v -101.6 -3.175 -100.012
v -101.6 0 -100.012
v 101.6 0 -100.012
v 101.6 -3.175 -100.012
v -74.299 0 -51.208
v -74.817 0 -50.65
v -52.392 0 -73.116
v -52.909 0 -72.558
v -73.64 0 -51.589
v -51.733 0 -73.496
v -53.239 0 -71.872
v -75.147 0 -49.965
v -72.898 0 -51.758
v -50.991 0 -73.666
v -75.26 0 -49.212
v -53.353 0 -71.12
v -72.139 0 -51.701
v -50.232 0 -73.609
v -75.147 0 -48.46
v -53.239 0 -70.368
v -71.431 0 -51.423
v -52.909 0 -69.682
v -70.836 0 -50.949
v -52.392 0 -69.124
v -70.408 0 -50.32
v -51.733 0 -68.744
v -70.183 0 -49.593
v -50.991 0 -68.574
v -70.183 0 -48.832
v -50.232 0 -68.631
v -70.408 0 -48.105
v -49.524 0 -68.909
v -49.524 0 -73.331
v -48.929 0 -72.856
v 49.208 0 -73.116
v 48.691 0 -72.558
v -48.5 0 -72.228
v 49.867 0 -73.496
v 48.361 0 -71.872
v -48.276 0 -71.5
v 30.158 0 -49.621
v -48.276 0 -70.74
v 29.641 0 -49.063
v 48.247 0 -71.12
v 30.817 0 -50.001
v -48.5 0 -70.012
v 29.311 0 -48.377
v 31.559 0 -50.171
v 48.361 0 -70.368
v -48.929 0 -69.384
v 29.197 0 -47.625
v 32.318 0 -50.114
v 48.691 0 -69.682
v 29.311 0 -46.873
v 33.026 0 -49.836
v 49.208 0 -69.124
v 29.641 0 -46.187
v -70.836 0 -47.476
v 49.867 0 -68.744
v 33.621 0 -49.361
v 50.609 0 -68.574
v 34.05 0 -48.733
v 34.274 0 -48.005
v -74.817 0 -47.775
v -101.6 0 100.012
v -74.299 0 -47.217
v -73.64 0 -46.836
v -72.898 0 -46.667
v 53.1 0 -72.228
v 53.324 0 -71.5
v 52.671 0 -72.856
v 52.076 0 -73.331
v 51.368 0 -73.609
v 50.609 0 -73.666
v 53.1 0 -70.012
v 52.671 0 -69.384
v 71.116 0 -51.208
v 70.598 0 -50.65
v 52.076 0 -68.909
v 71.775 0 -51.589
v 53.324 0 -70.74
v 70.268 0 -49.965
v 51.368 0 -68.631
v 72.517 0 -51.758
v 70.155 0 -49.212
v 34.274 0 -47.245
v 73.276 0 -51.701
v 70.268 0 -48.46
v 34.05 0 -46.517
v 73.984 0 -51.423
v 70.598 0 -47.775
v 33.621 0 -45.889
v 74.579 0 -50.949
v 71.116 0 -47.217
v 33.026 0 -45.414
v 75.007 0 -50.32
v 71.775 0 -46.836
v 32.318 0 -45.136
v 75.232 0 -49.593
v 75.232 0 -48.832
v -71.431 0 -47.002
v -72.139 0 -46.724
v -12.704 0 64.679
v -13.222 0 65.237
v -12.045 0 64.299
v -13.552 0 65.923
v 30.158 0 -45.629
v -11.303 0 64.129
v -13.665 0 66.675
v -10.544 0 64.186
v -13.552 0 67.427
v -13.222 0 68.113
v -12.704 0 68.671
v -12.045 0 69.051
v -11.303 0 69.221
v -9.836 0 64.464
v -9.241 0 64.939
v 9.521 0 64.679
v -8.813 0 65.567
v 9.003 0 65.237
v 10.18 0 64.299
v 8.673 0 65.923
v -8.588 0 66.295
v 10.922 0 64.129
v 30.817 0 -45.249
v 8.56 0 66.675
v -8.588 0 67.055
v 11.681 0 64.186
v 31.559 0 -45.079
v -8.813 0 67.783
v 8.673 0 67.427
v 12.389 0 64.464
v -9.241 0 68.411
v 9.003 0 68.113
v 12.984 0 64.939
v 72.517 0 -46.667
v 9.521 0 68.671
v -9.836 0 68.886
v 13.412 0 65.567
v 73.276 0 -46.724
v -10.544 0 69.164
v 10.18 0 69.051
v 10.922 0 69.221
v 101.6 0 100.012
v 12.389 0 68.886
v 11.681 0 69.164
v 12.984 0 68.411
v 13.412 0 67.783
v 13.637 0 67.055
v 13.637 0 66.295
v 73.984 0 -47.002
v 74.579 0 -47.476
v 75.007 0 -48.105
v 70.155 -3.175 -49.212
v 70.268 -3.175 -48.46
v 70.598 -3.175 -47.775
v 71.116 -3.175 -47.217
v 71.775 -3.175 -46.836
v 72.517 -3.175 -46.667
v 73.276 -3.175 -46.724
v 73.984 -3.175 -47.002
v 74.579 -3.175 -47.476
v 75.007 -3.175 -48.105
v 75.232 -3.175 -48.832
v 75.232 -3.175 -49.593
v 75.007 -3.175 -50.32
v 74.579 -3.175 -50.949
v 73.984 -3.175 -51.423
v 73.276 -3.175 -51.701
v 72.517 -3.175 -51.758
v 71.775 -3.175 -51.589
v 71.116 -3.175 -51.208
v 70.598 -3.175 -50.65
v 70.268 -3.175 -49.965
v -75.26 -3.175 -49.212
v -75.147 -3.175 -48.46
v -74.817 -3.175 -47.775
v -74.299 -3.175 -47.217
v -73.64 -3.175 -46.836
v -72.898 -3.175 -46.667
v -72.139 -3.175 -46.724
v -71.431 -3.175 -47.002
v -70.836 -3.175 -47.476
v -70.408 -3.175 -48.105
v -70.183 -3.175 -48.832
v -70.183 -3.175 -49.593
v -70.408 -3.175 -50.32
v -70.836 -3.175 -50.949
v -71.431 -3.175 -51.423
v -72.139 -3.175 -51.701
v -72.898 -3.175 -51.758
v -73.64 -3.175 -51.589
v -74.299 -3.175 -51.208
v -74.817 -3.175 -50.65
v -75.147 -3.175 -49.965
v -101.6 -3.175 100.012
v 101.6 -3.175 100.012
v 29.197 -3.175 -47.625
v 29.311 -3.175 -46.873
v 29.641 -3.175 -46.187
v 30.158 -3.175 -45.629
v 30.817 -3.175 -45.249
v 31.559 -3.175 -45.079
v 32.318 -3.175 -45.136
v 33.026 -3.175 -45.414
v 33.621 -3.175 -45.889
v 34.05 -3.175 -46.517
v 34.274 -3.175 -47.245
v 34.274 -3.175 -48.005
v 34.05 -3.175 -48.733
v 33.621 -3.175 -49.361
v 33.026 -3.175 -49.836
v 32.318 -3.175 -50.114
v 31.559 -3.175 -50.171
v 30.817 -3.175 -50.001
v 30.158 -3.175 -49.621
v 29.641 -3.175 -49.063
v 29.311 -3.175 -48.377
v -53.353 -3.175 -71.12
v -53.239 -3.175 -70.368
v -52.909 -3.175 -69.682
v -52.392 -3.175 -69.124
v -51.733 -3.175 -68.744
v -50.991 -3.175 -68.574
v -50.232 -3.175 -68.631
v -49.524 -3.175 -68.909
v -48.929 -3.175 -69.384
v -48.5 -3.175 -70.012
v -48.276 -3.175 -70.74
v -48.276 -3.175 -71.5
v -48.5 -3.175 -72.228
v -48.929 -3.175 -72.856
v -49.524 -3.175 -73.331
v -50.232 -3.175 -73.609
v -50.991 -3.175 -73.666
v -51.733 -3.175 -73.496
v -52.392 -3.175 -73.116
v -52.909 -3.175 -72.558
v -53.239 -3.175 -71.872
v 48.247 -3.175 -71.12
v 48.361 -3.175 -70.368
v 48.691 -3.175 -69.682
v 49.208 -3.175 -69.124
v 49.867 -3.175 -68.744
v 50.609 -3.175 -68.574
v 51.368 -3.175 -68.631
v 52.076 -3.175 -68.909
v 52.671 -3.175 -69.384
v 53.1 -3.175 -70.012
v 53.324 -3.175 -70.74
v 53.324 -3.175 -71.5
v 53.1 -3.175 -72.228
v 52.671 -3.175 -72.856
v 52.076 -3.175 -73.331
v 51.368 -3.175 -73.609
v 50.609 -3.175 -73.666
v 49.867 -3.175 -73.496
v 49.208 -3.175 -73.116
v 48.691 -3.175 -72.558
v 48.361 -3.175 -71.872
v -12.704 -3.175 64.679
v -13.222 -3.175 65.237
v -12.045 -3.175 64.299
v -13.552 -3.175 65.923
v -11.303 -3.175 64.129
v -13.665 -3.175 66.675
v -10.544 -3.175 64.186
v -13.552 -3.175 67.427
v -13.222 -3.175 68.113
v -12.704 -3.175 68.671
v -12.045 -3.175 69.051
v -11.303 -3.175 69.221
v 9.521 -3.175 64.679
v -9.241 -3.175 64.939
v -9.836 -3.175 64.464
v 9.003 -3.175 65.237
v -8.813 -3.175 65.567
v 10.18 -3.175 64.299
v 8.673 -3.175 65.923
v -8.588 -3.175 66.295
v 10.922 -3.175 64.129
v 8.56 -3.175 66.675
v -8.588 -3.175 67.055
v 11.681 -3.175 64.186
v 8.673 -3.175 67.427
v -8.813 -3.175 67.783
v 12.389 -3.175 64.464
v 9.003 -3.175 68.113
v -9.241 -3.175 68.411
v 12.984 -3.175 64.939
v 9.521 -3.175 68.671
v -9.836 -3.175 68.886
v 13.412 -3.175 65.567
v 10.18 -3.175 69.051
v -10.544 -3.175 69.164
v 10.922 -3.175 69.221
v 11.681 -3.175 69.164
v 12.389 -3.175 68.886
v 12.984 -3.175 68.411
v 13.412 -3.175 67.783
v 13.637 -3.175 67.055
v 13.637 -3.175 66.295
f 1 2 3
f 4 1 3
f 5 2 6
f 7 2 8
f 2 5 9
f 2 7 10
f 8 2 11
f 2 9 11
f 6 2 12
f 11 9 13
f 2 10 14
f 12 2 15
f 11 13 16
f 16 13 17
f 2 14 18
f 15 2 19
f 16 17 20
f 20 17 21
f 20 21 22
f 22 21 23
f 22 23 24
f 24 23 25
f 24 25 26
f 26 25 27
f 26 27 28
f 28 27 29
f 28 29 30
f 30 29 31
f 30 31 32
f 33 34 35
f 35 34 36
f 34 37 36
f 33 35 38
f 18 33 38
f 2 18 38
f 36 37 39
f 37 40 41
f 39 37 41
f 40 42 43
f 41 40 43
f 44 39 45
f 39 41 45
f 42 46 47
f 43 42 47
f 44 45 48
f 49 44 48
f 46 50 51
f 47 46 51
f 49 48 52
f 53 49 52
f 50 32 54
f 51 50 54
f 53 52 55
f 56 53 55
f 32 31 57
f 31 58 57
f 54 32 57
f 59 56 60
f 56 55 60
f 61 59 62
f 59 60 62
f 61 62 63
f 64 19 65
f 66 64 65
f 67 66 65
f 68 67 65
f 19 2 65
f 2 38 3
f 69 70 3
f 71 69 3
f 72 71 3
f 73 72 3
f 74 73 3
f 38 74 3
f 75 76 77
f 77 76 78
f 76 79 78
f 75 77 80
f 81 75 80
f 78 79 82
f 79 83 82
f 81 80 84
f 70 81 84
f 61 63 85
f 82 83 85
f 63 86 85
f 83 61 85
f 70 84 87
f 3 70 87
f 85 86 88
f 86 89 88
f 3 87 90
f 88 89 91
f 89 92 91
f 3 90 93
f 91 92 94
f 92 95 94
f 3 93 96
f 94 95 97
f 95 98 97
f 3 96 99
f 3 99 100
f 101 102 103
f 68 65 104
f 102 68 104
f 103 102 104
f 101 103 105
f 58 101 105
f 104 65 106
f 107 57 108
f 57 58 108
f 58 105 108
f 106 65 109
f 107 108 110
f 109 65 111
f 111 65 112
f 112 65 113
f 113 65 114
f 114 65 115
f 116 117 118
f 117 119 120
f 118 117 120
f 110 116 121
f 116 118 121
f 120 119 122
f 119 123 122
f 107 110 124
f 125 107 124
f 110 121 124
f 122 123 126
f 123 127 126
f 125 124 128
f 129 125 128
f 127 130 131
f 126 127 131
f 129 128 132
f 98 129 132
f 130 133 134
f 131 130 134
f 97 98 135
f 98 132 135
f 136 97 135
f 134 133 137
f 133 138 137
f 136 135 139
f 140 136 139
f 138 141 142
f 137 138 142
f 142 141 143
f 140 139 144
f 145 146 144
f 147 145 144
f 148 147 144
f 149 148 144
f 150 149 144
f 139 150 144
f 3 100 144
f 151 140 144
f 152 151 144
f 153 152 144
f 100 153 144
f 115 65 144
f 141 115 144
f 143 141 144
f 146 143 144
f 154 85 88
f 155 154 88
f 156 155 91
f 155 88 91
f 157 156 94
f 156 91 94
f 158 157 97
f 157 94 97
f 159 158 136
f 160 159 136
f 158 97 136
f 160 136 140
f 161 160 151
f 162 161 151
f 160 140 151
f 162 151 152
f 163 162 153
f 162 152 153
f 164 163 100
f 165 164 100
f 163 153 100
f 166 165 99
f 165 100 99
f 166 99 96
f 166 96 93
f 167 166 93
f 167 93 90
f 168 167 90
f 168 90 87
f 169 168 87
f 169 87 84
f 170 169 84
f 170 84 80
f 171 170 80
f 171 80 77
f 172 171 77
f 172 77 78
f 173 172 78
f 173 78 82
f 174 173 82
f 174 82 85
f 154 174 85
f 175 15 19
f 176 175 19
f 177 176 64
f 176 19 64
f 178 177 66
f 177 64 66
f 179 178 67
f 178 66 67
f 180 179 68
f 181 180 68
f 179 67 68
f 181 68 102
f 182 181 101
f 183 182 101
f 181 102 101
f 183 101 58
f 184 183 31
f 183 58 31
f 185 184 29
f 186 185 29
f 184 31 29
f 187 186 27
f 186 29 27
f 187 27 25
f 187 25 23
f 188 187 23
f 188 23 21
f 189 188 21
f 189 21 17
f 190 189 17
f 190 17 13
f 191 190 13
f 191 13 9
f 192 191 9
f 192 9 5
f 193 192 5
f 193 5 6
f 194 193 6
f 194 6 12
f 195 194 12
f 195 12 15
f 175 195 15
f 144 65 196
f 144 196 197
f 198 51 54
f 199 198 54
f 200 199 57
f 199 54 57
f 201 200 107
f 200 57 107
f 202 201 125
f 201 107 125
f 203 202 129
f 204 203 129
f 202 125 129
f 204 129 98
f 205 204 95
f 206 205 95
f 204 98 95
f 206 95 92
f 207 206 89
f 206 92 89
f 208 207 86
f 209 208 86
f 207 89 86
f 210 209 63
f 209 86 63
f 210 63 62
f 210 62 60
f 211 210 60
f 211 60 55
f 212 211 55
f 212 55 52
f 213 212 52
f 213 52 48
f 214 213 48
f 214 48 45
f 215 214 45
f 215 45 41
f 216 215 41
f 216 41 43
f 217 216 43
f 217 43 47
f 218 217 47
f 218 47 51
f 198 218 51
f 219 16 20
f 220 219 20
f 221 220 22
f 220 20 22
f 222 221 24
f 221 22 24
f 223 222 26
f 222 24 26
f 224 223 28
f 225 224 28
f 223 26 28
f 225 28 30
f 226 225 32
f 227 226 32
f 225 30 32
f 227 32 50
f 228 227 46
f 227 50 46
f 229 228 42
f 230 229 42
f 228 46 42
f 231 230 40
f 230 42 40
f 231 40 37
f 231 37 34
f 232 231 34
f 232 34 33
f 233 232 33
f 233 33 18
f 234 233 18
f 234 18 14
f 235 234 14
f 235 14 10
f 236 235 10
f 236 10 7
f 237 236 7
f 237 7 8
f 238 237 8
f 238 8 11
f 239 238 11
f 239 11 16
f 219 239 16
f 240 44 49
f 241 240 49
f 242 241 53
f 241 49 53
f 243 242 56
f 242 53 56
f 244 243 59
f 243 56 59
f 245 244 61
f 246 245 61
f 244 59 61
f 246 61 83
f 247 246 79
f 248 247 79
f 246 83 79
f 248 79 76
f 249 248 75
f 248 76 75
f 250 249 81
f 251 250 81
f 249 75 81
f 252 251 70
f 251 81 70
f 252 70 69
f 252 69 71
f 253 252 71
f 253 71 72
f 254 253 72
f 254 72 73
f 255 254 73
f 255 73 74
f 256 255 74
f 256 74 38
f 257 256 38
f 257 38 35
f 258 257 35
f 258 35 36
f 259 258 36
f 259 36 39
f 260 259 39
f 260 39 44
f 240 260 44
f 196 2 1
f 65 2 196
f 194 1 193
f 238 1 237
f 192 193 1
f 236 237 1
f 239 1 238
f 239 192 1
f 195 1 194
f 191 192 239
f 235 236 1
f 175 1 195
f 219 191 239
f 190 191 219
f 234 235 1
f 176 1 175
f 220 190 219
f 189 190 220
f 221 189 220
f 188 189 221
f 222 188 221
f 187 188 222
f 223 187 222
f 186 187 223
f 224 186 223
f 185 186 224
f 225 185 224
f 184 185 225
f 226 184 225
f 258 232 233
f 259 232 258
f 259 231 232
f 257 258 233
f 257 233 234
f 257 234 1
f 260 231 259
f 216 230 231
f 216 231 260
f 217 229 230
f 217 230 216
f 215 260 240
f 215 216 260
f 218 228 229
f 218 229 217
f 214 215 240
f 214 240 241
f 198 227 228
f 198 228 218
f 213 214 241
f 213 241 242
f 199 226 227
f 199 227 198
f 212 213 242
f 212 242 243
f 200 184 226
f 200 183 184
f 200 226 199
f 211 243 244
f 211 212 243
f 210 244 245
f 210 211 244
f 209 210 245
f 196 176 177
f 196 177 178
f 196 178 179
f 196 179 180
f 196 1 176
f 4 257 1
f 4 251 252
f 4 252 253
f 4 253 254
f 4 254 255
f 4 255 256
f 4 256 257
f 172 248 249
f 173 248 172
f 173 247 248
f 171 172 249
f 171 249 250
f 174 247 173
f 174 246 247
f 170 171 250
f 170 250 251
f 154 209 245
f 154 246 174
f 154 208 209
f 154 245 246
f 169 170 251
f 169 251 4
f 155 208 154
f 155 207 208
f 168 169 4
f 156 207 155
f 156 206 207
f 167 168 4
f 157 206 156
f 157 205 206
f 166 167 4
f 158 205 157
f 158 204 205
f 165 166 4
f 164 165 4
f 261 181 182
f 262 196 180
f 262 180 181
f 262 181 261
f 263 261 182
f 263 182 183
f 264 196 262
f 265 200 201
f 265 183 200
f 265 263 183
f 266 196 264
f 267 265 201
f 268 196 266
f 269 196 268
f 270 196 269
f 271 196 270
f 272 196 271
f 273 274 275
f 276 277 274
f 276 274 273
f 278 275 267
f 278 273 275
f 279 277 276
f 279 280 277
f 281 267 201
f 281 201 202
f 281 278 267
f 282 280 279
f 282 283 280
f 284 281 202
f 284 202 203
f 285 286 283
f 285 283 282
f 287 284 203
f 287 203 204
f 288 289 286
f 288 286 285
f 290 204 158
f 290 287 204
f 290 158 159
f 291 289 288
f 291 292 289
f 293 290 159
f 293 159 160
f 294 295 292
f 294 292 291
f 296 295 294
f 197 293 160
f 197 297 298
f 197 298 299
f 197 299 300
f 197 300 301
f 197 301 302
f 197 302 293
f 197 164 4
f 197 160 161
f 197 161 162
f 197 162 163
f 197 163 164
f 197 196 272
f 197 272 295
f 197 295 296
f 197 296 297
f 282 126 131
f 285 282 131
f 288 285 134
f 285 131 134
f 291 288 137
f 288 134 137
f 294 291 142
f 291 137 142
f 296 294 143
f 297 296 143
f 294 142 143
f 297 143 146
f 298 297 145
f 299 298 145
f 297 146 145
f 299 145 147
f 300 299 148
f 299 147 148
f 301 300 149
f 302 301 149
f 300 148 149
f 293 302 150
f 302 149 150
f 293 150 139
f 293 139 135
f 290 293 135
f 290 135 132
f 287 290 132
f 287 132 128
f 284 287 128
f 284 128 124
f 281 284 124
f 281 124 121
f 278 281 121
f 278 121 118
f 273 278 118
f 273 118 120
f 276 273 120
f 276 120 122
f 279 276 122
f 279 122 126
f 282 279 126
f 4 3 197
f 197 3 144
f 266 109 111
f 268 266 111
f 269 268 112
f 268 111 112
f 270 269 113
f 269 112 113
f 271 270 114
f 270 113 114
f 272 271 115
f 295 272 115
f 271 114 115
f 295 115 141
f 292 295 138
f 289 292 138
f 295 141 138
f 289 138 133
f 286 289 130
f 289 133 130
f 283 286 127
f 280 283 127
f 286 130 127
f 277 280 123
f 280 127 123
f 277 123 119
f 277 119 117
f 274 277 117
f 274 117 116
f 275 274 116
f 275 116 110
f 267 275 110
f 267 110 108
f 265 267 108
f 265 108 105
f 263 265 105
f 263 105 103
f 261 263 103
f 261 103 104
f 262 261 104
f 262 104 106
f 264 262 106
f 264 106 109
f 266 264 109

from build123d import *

# Parameters (mm, degrees)
F0_W     = 203.2
F0_H     = 200.025
F1_DEPTH = 3.175
F3_D     = 5.1054
F3_DEPTH = 25
F3_TIP   = 1.5338169022


# Not quite as in the source:
# - a length typed as a fraction of an inch, garbled in the dataset ("3 / 203.2 mm" for 3/8 in), is restored


with BuildPart() as f1:
    # F0 (on Front) → F1 (new body)
    with BuildSketch(Plane.XZ):
        Rectangle(F0_W, F0_H)
    extrude(amount=F1_DEPTH)

    # F3
    with Locations(Plane.XZ.offset(3.175)):
        with Locations((-72.7075, -49.2125), (72.7075, -49.2125), (-50.8, -71.12), (50.8, -71.12), (31.75, -47.625), (-11.1125, 66.675), (11.1125, 66.675)):
            Hole(F3_D / 2, depth=F3_DEPTH)
            with Locations((0, 0, -(F3_DEPTH + F3_TIP / 2))):  # 118° drill point
                Cone(0, F3_D / 2, F3_TIP, mode=Mode.SUBTRACT)


solid = f1.part
